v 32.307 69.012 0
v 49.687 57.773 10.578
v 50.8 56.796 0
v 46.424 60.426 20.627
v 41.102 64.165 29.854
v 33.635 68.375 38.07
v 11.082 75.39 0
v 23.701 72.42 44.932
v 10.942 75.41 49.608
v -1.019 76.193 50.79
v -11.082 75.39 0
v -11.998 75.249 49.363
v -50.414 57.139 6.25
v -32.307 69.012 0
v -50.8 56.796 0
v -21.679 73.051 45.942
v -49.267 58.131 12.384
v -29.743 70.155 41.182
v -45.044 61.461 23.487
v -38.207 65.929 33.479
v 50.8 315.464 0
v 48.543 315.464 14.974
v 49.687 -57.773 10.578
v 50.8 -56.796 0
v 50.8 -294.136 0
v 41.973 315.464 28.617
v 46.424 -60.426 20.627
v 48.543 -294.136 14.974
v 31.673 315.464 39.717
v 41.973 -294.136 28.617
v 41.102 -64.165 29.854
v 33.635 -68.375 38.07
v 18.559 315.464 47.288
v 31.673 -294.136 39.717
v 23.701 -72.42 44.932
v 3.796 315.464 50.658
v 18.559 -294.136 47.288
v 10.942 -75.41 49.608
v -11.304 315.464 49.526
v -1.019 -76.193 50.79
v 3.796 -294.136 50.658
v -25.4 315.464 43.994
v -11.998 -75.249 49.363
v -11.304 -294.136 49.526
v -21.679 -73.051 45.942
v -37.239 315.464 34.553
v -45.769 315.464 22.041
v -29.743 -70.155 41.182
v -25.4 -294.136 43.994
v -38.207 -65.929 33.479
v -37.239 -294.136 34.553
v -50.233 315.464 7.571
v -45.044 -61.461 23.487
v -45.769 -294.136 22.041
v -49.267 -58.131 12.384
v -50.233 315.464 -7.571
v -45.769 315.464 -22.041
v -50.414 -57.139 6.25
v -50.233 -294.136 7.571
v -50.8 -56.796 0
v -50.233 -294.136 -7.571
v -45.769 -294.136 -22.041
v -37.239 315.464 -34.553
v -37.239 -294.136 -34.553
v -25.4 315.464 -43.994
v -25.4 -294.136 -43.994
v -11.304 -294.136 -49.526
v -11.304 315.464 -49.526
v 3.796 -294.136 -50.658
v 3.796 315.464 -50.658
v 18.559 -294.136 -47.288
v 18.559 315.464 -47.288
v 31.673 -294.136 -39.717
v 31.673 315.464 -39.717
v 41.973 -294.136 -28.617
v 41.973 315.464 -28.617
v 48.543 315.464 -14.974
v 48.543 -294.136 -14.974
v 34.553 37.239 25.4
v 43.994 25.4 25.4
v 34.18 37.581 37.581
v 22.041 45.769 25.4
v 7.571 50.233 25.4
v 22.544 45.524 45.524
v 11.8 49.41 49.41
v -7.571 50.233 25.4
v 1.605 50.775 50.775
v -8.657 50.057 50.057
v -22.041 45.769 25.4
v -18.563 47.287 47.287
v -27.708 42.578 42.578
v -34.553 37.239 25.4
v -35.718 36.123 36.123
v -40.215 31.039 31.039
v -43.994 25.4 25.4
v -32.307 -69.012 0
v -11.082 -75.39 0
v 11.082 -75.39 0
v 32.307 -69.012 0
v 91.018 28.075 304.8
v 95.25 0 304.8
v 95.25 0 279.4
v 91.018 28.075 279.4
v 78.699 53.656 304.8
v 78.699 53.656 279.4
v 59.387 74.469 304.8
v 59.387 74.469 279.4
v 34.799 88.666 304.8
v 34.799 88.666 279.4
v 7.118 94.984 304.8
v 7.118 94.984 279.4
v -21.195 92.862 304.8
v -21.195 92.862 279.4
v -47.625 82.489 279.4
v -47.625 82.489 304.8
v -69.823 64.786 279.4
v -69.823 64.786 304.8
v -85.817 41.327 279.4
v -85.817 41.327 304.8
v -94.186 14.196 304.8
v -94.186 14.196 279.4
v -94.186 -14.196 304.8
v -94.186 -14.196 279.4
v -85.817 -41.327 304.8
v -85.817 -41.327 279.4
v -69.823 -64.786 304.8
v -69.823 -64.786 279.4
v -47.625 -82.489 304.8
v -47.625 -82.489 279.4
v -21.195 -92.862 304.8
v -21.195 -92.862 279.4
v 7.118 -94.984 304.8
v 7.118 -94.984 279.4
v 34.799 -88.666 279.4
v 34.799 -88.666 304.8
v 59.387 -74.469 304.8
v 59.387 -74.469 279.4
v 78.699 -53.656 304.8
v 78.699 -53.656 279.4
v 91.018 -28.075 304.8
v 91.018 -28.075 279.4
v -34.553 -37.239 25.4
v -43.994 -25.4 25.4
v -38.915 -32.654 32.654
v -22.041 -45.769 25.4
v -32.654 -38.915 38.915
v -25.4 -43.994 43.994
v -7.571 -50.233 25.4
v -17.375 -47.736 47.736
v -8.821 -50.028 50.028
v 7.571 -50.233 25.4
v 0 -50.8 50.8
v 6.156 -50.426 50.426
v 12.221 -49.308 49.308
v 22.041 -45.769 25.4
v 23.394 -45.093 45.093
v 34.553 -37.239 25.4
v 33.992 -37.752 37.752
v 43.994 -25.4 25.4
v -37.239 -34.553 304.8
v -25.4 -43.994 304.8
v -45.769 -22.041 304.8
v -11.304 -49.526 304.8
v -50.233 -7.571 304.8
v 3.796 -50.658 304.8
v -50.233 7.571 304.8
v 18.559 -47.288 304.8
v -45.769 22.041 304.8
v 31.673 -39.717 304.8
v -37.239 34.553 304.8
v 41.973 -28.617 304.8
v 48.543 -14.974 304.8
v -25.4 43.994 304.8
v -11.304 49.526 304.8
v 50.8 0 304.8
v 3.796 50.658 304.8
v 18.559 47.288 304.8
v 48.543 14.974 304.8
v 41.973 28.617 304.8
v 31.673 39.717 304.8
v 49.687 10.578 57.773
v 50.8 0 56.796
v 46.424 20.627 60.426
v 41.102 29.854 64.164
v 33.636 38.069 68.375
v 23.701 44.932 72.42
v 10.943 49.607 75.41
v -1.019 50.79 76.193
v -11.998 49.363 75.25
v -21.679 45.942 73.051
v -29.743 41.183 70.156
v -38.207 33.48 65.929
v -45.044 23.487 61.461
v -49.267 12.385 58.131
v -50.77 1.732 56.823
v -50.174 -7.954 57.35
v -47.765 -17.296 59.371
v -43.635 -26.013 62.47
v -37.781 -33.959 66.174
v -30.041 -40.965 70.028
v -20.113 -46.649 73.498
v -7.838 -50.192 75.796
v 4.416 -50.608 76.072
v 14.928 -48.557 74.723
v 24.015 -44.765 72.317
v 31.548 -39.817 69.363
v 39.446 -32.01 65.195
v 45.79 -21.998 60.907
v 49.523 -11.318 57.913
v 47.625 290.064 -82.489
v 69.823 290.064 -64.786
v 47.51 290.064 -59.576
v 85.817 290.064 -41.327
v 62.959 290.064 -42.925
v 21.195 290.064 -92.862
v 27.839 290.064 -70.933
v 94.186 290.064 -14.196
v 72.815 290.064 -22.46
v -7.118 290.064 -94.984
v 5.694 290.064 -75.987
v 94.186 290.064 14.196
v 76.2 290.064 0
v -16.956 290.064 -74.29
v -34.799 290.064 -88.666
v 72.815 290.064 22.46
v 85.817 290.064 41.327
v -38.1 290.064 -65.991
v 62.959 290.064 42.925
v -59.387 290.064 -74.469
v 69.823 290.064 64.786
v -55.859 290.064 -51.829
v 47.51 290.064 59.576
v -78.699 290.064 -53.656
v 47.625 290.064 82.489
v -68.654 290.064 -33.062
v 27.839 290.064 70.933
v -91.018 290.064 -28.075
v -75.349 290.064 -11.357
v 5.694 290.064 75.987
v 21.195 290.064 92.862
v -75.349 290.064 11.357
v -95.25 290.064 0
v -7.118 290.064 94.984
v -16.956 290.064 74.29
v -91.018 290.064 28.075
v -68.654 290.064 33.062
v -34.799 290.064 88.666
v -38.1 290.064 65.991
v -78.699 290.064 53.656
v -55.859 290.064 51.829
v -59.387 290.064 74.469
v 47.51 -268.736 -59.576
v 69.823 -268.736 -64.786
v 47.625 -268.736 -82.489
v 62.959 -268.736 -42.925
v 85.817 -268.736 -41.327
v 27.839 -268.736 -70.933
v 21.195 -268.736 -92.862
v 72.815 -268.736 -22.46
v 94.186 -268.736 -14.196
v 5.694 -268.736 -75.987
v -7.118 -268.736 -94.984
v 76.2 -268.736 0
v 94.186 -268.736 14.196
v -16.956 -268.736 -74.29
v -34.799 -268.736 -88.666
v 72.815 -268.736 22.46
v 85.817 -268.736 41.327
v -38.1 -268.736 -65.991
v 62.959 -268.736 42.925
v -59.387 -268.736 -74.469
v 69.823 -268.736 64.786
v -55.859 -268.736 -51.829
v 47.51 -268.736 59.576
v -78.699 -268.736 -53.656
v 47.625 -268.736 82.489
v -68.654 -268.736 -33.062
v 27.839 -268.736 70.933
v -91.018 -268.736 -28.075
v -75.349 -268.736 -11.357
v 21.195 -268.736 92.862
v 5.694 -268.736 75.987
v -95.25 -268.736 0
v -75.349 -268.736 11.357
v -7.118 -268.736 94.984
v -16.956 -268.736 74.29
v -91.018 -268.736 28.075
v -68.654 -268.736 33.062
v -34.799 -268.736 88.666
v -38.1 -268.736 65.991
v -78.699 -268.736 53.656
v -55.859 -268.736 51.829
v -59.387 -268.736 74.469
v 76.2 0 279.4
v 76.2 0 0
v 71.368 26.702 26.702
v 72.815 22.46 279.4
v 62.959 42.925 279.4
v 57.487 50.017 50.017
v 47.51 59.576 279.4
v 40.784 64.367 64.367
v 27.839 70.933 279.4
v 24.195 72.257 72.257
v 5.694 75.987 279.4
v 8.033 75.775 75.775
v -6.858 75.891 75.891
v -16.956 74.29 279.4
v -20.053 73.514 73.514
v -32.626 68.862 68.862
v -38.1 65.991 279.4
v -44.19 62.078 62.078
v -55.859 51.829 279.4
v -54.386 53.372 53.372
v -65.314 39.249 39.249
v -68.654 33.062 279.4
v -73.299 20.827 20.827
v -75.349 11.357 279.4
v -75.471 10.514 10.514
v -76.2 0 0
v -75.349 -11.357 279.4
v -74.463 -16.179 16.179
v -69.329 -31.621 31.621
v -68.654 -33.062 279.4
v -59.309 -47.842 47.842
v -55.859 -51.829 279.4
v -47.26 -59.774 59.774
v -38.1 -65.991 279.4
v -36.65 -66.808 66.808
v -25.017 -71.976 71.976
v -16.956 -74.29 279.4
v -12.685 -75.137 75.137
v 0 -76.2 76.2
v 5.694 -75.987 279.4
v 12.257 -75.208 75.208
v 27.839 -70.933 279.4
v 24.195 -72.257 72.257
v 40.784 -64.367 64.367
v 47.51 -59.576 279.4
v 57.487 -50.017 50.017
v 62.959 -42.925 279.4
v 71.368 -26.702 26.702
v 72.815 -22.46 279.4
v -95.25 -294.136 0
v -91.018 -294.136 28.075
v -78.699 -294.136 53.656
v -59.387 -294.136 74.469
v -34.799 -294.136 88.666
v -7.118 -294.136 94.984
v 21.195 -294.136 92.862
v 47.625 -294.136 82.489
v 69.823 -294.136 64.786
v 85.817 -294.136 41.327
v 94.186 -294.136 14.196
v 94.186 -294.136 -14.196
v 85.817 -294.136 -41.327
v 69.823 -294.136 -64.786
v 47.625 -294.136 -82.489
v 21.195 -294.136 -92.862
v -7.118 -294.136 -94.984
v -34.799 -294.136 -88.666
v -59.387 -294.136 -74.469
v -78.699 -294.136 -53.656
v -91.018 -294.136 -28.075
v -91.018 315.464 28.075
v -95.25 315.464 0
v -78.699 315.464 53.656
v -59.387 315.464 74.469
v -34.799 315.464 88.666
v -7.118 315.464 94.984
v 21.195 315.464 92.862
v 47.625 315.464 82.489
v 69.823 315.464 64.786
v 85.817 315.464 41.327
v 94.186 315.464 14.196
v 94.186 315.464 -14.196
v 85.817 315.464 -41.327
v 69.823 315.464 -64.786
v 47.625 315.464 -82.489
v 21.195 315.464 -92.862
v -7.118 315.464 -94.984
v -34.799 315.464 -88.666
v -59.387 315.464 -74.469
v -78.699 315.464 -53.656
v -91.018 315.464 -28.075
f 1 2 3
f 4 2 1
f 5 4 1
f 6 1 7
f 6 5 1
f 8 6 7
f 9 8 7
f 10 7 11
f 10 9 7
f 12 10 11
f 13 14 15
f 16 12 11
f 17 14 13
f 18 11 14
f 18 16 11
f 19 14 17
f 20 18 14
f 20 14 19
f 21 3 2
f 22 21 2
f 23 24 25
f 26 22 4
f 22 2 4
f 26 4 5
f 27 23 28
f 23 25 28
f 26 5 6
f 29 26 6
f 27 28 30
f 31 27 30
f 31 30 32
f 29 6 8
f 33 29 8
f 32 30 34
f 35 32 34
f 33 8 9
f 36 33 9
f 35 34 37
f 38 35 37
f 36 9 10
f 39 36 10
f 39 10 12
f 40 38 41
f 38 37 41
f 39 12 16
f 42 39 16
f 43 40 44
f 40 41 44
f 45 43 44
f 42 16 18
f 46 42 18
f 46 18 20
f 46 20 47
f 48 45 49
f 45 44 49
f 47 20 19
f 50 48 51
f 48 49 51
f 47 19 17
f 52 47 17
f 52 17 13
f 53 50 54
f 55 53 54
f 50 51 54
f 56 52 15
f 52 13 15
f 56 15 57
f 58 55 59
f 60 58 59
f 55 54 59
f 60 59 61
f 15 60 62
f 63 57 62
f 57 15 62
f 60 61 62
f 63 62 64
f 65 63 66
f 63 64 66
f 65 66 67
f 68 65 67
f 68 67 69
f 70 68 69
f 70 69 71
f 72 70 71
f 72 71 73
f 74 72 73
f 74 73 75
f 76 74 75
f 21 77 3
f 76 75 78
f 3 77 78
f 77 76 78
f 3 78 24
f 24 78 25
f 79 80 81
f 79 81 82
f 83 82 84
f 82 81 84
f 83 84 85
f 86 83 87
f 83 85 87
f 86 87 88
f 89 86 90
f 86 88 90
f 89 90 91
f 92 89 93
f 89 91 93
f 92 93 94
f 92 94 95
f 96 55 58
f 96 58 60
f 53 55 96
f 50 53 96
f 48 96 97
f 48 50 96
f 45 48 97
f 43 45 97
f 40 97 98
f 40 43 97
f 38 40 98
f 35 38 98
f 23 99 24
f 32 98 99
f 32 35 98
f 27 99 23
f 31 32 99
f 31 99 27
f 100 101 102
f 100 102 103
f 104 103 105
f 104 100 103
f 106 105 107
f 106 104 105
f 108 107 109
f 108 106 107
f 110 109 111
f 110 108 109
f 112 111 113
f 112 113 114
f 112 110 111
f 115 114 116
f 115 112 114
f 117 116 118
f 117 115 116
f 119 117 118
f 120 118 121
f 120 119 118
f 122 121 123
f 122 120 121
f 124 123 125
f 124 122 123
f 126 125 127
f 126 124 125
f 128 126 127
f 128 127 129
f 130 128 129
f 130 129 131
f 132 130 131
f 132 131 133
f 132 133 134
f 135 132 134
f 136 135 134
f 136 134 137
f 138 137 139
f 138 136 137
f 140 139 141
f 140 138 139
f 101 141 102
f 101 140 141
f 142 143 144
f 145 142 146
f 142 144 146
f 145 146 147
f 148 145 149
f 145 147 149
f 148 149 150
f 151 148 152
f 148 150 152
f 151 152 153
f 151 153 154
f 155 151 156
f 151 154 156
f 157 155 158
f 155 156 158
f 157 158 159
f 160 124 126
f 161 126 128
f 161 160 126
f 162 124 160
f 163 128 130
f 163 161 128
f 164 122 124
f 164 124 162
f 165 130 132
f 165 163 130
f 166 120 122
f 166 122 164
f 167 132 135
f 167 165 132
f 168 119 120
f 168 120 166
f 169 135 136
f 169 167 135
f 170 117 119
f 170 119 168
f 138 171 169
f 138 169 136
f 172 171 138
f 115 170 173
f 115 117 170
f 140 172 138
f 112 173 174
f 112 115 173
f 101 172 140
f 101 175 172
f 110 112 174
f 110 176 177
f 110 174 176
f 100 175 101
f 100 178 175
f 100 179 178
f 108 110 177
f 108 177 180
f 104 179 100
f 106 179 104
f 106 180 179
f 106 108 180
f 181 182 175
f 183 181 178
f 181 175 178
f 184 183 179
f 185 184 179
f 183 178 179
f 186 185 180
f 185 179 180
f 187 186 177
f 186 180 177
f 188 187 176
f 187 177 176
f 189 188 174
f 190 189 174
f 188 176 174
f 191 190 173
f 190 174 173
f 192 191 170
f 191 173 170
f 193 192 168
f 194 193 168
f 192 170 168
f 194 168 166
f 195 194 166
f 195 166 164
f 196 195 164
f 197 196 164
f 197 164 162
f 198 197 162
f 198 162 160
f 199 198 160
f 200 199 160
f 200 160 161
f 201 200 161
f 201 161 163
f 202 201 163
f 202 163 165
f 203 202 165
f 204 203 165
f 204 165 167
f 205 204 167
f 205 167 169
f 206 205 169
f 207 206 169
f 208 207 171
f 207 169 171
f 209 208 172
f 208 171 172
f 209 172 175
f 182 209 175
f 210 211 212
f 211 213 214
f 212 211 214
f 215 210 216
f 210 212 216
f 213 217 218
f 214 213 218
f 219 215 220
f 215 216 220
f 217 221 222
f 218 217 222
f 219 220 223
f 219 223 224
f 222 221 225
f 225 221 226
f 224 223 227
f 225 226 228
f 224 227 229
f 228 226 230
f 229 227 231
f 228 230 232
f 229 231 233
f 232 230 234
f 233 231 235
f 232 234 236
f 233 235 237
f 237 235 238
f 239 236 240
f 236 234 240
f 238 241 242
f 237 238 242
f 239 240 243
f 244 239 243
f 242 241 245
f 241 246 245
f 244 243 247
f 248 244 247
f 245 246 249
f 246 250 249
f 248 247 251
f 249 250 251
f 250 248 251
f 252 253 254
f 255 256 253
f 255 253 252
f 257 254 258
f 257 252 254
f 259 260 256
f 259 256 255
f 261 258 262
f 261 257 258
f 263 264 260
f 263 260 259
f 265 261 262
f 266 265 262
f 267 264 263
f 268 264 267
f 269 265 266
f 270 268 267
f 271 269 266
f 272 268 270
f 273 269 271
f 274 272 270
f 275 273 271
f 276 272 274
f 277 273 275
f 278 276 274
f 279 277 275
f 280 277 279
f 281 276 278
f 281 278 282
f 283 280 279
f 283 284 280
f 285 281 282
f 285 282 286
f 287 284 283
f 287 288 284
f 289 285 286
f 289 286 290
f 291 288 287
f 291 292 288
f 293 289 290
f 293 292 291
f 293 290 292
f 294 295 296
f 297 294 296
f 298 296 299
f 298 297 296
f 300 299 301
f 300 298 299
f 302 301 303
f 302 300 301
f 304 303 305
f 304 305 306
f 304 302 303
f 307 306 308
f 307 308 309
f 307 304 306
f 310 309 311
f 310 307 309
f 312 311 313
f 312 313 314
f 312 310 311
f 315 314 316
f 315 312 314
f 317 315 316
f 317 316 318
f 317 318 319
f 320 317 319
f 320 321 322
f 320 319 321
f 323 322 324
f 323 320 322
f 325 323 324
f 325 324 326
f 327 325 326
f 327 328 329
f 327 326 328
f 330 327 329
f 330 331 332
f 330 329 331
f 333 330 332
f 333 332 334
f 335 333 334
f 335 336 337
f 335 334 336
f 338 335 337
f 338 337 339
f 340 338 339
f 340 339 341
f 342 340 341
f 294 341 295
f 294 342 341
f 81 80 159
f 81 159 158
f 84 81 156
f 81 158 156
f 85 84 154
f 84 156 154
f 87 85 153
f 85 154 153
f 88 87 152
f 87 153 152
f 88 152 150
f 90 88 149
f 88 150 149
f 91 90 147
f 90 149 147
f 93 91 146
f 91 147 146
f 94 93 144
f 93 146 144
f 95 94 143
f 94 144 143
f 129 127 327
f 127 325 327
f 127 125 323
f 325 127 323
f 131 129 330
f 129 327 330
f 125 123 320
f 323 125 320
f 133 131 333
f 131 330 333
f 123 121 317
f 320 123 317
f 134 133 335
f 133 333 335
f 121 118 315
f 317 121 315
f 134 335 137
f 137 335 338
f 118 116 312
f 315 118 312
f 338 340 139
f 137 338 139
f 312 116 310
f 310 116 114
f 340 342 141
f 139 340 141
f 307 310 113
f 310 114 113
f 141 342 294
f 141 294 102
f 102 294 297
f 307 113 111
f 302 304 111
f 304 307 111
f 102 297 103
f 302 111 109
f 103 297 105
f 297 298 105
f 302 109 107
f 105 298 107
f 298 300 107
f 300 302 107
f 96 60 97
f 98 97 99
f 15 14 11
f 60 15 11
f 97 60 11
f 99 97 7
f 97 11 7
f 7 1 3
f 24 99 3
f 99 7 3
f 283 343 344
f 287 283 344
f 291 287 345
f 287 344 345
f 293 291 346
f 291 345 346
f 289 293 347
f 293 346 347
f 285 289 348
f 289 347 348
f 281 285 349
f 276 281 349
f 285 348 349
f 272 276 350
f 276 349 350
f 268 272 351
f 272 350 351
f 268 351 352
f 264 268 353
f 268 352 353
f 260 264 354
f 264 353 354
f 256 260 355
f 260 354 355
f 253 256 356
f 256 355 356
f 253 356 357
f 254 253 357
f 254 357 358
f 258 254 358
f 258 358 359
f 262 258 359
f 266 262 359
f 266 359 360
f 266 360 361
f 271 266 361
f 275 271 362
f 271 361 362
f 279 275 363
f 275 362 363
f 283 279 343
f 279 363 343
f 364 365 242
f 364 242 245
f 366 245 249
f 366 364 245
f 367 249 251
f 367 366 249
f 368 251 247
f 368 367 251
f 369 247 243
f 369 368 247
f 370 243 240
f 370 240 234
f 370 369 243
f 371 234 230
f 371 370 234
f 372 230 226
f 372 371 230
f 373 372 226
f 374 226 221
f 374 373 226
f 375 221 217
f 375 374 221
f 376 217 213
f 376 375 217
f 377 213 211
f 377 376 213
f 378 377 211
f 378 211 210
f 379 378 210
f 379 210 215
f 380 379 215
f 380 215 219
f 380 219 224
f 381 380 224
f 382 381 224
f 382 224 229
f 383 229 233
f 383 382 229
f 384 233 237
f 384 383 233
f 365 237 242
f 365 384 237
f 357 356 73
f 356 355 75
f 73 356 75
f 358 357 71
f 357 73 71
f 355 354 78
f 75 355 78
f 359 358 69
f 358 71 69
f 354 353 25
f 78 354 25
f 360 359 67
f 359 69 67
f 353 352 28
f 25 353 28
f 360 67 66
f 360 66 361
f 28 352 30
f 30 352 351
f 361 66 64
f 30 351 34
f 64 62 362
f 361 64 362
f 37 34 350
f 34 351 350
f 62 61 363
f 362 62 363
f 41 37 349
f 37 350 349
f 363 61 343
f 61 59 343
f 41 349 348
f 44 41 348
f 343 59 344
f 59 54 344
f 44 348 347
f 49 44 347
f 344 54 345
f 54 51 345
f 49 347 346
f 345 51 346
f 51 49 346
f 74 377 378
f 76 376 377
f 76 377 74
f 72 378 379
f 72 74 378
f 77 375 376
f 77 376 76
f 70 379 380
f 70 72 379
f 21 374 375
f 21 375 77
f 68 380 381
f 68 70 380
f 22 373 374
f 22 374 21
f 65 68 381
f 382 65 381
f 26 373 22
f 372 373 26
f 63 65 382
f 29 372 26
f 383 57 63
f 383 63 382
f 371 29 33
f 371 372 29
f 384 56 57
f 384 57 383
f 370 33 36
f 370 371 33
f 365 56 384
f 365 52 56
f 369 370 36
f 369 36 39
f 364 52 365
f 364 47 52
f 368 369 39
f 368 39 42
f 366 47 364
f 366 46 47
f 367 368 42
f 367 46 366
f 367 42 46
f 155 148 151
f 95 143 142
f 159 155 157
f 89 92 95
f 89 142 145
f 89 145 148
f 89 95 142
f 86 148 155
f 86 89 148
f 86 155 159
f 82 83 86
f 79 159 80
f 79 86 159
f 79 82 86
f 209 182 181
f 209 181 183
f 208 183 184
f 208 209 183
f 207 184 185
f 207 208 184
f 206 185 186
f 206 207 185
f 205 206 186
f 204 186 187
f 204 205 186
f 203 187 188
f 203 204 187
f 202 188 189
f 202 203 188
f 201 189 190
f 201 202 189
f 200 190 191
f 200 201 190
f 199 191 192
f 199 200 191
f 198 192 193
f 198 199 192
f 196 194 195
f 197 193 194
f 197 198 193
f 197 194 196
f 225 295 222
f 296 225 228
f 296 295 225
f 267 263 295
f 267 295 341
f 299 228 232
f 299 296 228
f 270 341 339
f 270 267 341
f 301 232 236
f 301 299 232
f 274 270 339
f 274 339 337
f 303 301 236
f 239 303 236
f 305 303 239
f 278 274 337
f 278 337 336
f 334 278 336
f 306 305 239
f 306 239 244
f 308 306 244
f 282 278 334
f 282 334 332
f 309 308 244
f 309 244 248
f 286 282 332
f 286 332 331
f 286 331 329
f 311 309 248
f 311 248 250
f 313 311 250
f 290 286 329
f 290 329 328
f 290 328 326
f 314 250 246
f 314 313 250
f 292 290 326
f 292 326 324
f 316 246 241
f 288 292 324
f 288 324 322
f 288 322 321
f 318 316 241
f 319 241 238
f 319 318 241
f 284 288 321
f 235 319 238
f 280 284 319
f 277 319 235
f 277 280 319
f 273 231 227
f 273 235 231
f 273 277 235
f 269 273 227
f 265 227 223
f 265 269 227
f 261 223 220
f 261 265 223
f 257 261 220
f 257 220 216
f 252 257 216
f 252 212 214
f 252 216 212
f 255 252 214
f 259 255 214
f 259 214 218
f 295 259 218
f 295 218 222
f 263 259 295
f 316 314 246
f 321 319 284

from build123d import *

# Parameters (mm, degrees)
F2_R      = 76.2
F5_DEPTH  = 609.6
F4_R      = 76.2
F6_DEPTH  = 304.8
F7_T      = -25.4
F7_2_T    = -25.4
F9_R      = 95.25
F9_R_2    = 76.2
F10_DEPTH = 25.4
F12_R     = 95.25
F12_R_2   = 76.2
F13_DEPTH = 25.4
F14_R     = 95.25
F14_R_2   = 76.2
F15_DEPTH = 25.4


with BuildPart() as f5:
    # F2 (on plane+point) → F5 (new body)
    with BuildSketch(Plane.XZ.offset(294.1361665726)):
        Circle(F2_R)
    extrude(amount=-F5_DEPTH)

    # F7
    f7_openings = [f5.faces().sort_by_distance(p)[0] for p in [
        (0, 315.463833, 0),
        (0, -294.136167, 0),
    ]]
    offset(amount=F7_T, openings=f7_openings)

    # F9 (on line) → F10 (join)
    with BuildSketch(Plane(origin=(0, -294.1361665726, 0), x_dir=(-1, 0, 0), z_dir=(0, 1, 0))):
        Circle(F9_R)
        Circle(F9_R_2, mode=Mode.SUBTRACT)
    extrude(amount=F10_DEPTH)

    # F12 (on line) → F13 (join)
    with BuildSketch(Plane(origin=(0, 315.4638334274, 0), x_dir=(-1, 0, 0), z_dir=(0, 1, 0))):
        Circle(F12_R)
        Circle(F12_R_2, mode=Mode.SUBTRACT)
    extrude(amount=-F13_DEPTH)



with BuildPart() as f6:
    # F4 (on plane+point) → F6 (new body)
    with BuildSketch(Plane.XY.offset(304.8)):
        Circle(F4_R)
    extrude(amount=-F6_DEPTH)

    # F7#2
    f7_2_openings = [f6.faces().sort_by_distance(p)[0] for p in [
        (0, 0, 304.8),
    ]]
    offset(amount=F7_2_T, openings=f7_2_openings)


with BuildPart() as f5_1:
    add(f5.part)

    add(f6.part)  # F15 merges F6
    # F14 (on plane+point) → F15 (join)
    with BuildSketch(Plane.XY.offset(304.8)):
        Circle(F14_R)
        Circle(F14_R_2, mode=Mode.SUBTRACT)
    extrude(amount=-F15_DEPTH)


solid = f5_1.part
